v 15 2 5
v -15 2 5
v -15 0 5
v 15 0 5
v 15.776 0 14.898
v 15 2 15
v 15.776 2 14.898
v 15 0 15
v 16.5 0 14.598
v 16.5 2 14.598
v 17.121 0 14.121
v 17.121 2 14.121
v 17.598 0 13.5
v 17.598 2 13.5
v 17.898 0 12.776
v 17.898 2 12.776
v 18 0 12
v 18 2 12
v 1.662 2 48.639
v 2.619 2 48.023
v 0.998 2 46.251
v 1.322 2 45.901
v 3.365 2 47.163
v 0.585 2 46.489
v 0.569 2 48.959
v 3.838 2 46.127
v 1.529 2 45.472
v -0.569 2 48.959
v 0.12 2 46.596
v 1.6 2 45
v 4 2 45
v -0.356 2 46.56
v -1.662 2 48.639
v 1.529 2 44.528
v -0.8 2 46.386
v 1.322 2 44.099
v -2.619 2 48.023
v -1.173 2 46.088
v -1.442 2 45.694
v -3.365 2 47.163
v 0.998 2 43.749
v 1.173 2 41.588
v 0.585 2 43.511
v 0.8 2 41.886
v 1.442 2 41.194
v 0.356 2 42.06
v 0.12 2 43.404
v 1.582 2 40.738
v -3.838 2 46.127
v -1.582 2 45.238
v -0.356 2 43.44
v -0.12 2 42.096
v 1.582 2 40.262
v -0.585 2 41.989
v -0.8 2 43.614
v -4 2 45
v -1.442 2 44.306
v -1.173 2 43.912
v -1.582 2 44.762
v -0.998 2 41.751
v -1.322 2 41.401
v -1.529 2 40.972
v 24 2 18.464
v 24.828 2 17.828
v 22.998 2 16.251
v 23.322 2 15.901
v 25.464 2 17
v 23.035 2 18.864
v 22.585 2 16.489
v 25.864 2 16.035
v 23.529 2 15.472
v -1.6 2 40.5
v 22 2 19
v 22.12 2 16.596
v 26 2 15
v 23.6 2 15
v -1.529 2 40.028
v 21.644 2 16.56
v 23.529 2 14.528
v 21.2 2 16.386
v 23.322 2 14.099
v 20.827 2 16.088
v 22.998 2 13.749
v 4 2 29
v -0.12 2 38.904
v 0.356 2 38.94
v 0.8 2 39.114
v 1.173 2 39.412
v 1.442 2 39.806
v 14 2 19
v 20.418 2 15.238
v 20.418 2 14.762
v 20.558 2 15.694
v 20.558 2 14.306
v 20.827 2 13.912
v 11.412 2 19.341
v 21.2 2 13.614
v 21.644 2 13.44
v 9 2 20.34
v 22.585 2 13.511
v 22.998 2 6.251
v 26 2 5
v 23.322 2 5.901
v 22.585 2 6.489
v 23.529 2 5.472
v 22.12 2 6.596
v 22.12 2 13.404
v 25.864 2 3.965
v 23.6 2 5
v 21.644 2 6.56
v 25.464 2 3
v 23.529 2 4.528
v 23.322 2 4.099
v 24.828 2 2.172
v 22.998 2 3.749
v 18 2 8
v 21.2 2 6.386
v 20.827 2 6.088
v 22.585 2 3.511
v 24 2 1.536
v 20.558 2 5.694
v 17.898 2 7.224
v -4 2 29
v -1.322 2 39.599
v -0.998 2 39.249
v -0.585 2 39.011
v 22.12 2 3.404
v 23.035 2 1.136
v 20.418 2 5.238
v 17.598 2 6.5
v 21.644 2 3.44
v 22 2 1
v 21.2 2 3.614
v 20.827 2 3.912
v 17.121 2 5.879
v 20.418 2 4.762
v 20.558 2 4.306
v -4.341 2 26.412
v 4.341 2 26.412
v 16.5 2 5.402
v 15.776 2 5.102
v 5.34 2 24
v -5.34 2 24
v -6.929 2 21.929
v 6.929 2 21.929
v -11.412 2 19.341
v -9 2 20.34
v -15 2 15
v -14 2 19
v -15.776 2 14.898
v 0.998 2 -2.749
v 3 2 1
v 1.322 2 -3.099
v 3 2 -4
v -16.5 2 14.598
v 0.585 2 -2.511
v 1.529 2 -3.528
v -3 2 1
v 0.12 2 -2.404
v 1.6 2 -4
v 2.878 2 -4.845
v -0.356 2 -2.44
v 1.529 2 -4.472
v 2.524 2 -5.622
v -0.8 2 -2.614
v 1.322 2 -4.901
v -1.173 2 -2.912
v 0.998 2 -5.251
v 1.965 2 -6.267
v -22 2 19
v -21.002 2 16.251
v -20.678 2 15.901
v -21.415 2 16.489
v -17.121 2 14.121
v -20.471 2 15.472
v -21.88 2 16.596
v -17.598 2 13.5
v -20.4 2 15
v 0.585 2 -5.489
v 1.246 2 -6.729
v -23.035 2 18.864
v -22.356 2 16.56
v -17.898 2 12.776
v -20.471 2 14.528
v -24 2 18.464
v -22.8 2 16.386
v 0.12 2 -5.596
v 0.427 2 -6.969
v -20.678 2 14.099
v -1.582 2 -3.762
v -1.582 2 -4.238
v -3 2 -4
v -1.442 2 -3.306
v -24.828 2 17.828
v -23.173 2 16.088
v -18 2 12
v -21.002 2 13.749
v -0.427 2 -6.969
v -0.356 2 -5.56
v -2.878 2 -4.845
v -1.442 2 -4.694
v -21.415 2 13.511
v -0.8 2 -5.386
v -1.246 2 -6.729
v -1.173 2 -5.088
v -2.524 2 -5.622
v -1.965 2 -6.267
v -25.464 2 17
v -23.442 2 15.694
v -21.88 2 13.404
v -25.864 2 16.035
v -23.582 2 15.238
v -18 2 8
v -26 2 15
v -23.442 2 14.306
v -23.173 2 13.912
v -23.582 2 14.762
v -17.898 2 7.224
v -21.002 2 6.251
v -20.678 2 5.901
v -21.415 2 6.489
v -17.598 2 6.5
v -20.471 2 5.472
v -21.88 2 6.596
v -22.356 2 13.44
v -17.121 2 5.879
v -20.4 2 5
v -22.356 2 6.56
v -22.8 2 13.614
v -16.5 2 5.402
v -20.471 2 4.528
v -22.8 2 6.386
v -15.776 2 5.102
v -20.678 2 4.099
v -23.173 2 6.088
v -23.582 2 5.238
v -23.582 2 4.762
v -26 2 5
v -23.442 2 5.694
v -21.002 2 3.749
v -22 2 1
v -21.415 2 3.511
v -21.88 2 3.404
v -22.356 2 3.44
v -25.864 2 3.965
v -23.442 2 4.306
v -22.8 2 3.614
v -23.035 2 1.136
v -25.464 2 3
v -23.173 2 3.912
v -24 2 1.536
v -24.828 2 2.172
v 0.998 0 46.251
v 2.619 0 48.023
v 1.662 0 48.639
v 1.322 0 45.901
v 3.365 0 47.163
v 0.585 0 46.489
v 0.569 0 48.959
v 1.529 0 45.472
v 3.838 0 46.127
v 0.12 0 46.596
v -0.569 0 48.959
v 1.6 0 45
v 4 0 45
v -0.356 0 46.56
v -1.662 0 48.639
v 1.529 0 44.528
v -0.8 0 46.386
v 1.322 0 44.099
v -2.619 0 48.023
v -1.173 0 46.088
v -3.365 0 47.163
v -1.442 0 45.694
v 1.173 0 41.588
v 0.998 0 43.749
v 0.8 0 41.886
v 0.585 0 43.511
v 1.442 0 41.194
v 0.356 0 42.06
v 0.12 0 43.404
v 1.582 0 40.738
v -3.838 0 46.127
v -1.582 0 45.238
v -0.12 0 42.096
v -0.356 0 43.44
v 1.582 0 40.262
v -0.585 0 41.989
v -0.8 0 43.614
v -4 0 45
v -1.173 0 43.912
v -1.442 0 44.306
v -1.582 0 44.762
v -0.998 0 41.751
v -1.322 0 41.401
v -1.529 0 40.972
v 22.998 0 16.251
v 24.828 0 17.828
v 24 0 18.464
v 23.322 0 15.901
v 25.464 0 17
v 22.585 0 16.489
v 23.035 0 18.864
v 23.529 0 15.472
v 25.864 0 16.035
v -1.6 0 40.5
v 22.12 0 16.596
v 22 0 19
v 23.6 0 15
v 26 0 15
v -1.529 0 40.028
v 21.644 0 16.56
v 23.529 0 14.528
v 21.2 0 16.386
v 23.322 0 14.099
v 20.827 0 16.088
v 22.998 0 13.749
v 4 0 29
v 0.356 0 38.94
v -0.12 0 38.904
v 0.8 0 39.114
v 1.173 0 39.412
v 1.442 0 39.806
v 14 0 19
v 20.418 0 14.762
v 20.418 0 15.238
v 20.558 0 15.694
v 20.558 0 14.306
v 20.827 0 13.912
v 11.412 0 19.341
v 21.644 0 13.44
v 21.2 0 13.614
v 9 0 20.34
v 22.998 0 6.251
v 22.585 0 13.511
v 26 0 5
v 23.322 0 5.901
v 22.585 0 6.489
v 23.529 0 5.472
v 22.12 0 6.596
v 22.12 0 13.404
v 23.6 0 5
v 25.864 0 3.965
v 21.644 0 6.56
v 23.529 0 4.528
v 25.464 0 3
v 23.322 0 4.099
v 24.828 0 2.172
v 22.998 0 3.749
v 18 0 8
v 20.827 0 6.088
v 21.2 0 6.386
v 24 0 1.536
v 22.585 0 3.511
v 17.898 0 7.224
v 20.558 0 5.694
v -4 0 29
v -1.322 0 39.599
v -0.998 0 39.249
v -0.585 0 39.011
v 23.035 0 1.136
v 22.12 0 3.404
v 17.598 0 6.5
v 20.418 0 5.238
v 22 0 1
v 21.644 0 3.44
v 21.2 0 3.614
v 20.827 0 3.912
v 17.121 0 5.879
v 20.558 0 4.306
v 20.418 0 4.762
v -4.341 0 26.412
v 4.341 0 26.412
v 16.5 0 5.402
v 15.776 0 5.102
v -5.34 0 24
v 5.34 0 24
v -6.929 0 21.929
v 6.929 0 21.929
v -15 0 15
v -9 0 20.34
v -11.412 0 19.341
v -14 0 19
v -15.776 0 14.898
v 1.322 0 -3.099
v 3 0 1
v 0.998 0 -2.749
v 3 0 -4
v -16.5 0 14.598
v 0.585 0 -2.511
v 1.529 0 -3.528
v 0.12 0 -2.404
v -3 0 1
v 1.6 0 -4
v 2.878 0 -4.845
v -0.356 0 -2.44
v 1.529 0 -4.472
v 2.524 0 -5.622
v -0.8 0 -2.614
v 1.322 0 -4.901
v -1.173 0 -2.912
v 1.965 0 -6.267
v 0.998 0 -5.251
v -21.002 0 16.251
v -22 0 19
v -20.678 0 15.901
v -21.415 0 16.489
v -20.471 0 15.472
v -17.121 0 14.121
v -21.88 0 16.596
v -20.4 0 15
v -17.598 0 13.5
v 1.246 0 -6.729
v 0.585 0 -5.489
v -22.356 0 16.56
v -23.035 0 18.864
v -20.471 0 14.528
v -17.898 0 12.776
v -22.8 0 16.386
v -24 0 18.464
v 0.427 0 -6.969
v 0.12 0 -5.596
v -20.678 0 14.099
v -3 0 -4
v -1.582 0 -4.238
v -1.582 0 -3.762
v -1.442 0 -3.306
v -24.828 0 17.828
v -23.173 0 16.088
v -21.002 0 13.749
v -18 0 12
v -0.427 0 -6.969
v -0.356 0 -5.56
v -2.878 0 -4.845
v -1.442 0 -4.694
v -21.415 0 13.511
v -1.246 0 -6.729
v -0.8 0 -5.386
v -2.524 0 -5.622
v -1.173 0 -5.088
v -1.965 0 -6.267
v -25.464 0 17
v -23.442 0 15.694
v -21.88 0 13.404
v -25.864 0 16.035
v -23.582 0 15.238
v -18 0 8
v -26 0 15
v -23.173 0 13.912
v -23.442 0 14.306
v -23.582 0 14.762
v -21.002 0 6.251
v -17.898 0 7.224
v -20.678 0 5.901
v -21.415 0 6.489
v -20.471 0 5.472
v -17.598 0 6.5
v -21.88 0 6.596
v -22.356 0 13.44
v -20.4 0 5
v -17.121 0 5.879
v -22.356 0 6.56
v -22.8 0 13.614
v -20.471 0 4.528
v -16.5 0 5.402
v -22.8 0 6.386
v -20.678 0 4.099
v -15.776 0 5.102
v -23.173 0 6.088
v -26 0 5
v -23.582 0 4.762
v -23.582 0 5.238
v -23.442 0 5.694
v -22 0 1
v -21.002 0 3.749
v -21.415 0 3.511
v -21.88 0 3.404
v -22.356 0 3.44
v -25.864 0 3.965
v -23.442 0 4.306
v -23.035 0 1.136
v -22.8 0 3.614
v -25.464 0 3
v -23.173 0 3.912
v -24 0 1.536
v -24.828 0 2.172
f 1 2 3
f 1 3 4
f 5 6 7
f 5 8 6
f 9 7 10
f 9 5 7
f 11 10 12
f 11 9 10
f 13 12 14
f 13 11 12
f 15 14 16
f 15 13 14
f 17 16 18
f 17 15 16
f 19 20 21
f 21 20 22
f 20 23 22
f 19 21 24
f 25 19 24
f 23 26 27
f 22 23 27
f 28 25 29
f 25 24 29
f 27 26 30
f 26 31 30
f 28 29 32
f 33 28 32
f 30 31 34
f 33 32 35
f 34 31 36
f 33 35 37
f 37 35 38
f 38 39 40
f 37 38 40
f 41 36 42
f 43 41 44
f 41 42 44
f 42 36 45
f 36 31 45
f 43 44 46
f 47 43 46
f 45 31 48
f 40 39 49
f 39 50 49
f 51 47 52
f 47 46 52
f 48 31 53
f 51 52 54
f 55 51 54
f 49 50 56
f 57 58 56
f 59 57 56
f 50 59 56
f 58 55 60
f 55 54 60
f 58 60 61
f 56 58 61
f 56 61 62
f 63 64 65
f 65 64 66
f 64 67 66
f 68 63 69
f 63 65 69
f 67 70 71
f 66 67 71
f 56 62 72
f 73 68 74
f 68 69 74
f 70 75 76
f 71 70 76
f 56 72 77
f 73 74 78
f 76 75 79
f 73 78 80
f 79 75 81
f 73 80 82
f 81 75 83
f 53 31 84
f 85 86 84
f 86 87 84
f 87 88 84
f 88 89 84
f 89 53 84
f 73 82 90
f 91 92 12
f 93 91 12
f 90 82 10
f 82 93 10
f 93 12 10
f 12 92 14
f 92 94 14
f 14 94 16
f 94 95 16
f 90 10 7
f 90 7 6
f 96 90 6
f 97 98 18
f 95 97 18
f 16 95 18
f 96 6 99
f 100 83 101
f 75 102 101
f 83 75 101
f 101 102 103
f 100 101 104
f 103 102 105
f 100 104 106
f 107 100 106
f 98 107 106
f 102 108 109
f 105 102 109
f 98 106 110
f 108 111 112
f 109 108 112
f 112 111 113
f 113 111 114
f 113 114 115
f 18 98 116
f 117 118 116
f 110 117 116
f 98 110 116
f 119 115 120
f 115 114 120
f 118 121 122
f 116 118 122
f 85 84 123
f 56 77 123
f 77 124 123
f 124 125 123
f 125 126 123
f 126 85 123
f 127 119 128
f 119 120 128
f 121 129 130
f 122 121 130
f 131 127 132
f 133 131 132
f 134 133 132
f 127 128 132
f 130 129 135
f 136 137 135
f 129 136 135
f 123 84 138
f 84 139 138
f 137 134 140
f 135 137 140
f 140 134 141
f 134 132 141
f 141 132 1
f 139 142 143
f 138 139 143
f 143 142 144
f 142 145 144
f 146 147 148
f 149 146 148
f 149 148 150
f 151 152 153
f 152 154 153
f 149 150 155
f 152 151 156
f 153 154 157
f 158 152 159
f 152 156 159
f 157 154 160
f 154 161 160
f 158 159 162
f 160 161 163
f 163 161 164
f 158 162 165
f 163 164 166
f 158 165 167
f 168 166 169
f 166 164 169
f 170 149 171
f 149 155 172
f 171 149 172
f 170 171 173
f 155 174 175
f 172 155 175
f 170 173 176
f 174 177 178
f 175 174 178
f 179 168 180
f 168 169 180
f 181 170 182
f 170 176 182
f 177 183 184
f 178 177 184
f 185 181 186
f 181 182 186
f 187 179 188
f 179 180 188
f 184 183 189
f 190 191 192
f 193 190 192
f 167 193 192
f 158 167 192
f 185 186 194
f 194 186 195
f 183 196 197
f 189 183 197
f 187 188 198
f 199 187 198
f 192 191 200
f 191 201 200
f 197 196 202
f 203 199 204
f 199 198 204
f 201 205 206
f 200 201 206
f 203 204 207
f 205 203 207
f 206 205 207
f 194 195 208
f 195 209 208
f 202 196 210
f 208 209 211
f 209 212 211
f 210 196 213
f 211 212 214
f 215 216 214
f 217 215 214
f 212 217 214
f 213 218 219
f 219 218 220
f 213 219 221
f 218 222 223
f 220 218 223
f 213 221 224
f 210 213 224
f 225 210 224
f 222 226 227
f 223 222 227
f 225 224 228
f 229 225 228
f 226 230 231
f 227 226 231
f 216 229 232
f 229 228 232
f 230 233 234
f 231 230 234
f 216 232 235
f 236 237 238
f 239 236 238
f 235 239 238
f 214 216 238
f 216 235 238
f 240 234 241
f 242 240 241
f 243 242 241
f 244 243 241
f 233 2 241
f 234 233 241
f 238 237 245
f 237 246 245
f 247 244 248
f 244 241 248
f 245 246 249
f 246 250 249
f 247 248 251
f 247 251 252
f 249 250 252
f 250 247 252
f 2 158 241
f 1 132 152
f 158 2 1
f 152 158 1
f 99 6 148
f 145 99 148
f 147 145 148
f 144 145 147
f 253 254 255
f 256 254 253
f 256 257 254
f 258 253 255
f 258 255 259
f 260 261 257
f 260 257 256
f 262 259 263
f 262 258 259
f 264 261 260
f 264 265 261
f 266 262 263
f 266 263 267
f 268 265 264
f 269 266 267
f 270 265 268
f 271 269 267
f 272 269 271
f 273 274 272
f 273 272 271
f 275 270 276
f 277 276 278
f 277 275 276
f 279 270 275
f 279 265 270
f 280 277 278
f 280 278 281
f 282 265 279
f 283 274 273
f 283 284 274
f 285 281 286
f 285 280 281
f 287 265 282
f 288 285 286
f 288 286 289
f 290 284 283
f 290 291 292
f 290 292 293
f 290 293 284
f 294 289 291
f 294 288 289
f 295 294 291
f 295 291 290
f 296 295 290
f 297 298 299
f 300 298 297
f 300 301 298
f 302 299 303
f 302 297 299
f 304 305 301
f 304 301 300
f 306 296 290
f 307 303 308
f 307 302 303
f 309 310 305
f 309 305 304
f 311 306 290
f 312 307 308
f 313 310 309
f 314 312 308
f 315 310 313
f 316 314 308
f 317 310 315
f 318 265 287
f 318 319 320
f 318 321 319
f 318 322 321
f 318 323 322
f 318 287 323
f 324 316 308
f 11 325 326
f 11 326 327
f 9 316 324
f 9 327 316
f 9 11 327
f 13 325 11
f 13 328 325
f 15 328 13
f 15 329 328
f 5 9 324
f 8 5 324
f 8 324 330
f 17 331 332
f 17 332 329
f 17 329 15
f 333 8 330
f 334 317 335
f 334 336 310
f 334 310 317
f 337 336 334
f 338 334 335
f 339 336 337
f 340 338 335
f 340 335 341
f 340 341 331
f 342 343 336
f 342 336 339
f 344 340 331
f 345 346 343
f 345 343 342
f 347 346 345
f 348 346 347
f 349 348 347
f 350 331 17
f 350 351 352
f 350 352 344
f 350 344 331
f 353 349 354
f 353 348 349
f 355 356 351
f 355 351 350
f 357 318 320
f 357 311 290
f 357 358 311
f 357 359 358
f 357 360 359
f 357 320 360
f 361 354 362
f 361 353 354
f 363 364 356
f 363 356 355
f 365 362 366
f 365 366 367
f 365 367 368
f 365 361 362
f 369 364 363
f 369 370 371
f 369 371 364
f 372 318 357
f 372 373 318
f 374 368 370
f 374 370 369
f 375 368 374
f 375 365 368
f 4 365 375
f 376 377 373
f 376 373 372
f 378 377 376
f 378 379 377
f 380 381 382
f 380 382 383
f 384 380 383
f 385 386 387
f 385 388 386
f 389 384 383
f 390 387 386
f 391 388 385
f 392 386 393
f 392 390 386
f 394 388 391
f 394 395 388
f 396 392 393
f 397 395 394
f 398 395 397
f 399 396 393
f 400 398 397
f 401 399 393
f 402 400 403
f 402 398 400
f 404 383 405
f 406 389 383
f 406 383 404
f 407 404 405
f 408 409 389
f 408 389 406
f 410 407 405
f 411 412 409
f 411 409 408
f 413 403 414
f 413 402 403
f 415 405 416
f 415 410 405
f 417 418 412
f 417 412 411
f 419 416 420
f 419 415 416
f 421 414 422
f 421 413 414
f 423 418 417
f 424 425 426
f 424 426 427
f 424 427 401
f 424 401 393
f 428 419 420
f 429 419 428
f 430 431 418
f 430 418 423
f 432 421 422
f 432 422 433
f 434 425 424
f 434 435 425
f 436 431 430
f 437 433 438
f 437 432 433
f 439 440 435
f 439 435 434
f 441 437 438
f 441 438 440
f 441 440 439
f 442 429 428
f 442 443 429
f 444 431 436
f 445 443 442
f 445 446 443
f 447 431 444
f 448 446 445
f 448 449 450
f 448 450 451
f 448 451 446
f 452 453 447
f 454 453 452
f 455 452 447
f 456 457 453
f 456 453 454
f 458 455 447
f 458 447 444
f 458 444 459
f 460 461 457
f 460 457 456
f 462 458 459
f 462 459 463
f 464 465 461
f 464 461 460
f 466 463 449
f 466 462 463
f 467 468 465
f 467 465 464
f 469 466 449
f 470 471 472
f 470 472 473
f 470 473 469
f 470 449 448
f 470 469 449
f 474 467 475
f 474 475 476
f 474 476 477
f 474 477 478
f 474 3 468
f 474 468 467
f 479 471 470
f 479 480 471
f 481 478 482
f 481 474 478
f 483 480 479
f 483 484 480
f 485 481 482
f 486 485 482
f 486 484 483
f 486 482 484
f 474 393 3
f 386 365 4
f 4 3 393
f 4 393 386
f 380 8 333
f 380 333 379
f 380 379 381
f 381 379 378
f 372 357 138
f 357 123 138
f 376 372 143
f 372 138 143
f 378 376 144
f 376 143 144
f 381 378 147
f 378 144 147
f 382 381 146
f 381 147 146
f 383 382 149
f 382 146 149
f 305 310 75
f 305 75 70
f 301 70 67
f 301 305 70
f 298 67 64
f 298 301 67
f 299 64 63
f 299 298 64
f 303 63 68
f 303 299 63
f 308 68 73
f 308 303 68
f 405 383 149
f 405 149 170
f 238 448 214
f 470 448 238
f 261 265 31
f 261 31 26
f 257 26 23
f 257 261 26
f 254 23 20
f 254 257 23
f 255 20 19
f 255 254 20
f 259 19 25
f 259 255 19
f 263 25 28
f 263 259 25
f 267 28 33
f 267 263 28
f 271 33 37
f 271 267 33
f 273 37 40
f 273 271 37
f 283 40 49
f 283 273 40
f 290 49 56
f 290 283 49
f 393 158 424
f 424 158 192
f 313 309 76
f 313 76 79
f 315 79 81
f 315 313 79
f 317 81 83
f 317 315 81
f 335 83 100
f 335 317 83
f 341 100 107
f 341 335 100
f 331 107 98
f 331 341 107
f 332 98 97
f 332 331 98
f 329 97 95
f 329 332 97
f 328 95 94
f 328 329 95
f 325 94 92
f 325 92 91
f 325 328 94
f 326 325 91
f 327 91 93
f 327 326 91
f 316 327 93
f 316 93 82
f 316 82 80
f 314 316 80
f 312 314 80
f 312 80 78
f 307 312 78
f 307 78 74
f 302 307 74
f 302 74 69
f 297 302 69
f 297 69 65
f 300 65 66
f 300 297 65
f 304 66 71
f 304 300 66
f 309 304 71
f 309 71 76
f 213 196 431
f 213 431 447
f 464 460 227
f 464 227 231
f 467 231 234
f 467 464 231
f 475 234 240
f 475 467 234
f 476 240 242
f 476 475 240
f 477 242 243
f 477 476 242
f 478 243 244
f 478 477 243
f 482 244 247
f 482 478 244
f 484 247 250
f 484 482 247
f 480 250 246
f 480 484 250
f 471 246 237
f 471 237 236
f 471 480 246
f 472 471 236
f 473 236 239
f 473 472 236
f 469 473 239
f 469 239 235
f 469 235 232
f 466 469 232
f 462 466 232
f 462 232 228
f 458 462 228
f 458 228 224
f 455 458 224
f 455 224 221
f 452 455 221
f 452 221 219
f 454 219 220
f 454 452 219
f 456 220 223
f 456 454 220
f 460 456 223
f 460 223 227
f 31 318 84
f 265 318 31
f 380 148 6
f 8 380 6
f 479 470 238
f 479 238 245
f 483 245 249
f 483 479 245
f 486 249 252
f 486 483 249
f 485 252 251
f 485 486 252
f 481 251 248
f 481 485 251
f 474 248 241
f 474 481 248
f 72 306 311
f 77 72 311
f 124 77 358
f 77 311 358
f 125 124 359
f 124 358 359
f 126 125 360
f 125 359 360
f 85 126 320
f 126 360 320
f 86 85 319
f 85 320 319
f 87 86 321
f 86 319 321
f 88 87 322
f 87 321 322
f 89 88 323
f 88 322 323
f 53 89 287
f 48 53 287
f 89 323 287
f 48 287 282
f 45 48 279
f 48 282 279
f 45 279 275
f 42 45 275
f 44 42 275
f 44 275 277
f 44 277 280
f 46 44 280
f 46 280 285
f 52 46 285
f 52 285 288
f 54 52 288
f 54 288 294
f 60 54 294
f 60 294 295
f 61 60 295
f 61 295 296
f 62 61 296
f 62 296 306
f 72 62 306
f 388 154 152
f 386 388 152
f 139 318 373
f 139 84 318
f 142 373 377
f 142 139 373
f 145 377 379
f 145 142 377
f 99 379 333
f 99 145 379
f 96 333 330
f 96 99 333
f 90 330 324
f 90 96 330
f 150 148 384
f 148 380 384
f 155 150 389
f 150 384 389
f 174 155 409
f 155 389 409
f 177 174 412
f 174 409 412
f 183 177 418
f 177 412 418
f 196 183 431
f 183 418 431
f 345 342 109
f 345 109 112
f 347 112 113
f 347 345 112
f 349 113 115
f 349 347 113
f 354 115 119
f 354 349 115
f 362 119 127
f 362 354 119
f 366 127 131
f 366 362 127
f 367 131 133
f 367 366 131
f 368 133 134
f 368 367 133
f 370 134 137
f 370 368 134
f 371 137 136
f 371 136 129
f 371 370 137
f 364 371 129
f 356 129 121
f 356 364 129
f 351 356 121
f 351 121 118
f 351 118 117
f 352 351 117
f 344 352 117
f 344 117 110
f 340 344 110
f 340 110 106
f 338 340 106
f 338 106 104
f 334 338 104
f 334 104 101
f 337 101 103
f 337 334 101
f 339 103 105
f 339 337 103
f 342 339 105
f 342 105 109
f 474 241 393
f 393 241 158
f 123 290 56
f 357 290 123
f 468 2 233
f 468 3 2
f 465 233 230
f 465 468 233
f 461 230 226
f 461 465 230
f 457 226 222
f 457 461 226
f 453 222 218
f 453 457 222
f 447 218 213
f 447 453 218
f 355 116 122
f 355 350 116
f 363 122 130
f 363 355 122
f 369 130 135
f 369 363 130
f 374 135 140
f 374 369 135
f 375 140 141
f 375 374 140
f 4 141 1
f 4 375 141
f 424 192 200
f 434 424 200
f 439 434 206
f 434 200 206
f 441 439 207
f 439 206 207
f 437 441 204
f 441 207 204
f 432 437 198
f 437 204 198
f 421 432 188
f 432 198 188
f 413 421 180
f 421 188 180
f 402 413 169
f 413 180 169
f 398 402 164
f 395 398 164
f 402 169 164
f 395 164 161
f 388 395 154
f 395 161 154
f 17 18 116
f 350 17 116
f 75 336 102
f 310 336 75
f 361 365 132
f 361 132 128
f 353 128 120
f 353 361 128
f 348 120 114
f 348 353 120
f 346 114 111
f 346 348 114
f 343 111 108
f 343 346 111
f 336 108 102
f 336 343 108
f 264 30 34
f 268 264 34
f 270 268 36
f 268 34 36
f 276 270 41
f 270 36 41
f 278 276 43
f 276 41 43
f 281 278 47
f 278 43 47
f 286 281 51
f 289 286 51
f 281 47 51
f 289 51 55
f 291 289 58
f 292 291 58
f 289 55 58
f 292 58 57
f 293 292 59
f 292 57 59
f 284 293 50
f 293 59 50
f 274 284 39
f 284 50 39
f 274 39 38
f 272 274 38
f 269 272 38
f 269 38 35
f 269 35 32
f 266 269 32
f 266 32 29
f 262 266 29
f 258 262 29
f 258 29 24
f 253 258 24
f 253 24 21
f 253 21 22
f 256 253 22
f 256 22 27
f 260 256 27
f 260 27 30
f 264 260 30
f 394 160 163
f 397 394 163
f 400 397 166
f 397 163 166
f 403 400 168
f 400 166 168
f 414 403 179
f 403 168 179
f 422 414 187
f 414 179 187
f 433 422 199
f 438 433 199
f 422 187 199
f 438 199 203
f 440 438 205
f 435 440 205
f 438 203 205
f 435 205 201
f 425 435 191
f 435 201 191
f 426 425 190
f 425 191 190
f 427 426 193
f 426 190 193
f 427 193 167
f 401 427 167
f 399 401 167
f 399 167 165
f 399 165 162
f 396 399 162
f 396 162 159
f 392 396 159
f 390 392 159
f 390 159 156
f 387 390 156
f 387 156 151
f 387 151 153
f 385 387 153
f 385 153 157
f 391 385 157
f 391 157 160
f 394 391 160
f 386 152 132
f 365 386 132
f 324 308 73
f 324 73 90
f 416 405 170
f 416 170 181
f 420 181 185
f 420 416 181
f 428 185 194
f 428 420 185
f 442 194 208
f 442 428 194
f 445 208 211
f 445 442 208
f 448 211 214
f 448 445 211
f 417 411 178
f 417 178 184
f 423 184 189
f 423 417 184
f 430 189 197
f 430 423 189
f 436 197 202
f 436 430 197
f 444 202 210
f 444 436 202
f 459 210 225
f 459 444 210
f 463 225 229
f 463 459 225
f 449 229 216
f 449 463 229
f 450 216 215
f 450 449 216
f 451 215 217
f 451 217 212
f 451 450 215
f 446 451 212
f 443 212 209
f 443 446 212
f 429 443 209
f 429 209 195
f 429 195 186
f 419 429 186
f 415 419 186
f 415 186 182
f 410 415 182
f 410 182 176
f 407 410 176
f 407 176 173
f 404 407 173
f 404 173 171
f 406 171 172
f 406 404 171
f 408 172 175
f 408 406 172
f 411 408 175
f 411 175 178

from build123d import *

# Parameters (mm, degrees)
SKETCH1_R            = 1.6
BOSS_EXTRUDE1_DEPTH  = 2
FILLET1_R            = 10
SKETCH2_R            = 4
BOSS_EXTRUDE3_DEPTH  = 2
SKETCH4_R            = 1.6
CUT_EXTRUDE2_DEPTH   = 4
CUT_EXTRUDE3_DEPTH   = 10
SKETCH6_R            = 3
SKETCH6_R_2          = 1.6
BOSS_EXTRUDE4_DEPTH  = 2
SKETCH7_R            = 1.6
CUT_EXTRUDE4_DEPTH   = 10
SKETCH8_W            = 36
SKETCH8_H            = 10
CUT_EXTRUDE6_DEPTH   = 9.5
FILLET3_R            = 3
SKETCH9_R            = 1.6
BOSS_EXTRUDE5_DEPTH  = 2
SKETCH10_R           = 1.6
BOSS_EXTRUDE6_DEPTH  = 2
SKETCH11_R           = 1.6
CUT_EXTRUDE7_DEPTH   = 10
BOSS_EXTRUDE7_DEPTH  = 2
SKETCH13_R           = 1.6
CUT_EXTRUDE9_DEPTH   = 5.5
BOSS_EXTRUDE8_DEPTH  = 2
SKETCH16_R           = 1.6
CUT_EXTRUDE10_DEPTH  = 10
SKETCH17_R           = 2.884899687
BOSS_EXTRUDE9_DEPTH  = 1
SKETCH18_R           = 1.6
BOSS_EXTRUDE10_DEPTH = 3
SKETCH19_R           = 1.6
SKETCH19_R_2         = 1.5
CUT_EXTRUDE11_DEPTH  = 2
SKETCH20_R           = 1.6
CUT_EXTRUDE12_DEPTH  = 10
SKETCH21_R           = 1.5
CUT_EXTRUDE13_DEPTH  = 8.5


with BuildPart() as part:
    # Sketch1 → Boss-Extrude1 (new body)
    with BuildSketch(Plane(origin=(0, 0, 0), x_dir=(1, 0, 0), z_dir=(0, 1, 0))):
        with BuildLine():
            Line((-4, -45), (-4, -30))
            Line((-4, -30), (-4, -19))
            Line((-4, -19), (-22, -19))
            ThreePointArc((-22, -19), (-24.828427125, -17.828427125), (-26, -15))
            Line((-26, -15), (-26, -5))
            ThreePointArc((-26, -5), (-24.828427125, -2.171572875), (-22, -1))
            Line((-22, -1), (-4, -1))
            Line((-4, -1), (-4, 0))
            ThreePointArc((-4, 0), (0, 4), (4, 0))
            Line((4, 0), (4, -1))
            Line((4, -1), (22, -1))
            ThreePointArc((22, -1), (24.828427125, -2.171572875), (26, -5))
            Line((26, -5), (26, -15))
            ThreePointArc((26, -15), (24.828427125, -17.828427125), (22, -19))
            Line((22, -19), (4, -19))
            Line((4, -19), (4, -30))
            Line((4, -30), (4, -45))
            ThreePointArc((4, -45), (0, -49), (-4, -45))
        make_face()
        with Locations((-22, -5)):
            Circle(SKETCH1_R, mode=Mode.SUBTRACT)
        Circle(SKETCH1_R, mode=Mode.SUBTRACT)
        with Locations((22, -5)):
            Circle(SKETCH1_R, mode=Mode.SUBTRACT)
        with Locations((22, -15)):
            Circle(SKETCH1_R, mode=Mode.SUBTRACT)
        with Locations((-22, -15)):
            Circle(SKETCH1_R, mode=Mode.SUBTRACT)
        with BuildLine():
            ThreePointArc((-1.6, -45), (0, -46.6), (1.6, -45))
            Line((1.6, -45), (1.6, -30))
            ThreePointArc((1.6, -30), (0, -28.4), (-1.6, -30))
            Line((-1.6, -30), (-1.6, -45))
        make_face(mode=Mode.SUBTRACT)
    extrude(amount=BOSS_EXTRUDE1_DEPTH)

    # Fillet1
    fillet1_edges = [part.edges().sort_by_distance(p)[0] for p in [
        (-4, 1, 19),
        (4, 1, 19),
    ]]
    fillet(fillet1_edges, radius=FILLET1_R)

    # Sketch2 → Boss-Extrude3 (add)
    with BuildSketch(Plane(origin=(0, 2, 0), x_dir=(1, 0, 0), z_dir=(0, 1, 0))):
        with BuildLine():
            ThreePointArc((-3.708099244, 1.5), (-2.797344782, 2.859171588), (-1.41859085, 3.74))
            ThreePointArc((-1.41859085, 3.74), (0, 4.6), (1.41859085, 3.74))
            ThreePointArc((1.41859085, 3.74), (2.797344782, 2.859171588), (3.708099244, 1.5))
            ThreePointArc((3.708099244, 1.5), (3.92634671, 2.23593095), (4, 3))
            ThreePointArc((4, 3), (0, 7), (-4, 3))
            ThreePointArc((-4, 3), (-3.92634671, 2.23593095), (-3.708099244, 1.5))
        make_face()
        with BuildLine():
            ThreePointArc((4, 3), (3.92634671, 2.23593095), (3.708099244, 1.5))
            ThreePointArc((3.708099244, 1.5), (3.92634671, 0.76406905), (4, 0))
            Line((4, 0), (4, 3))
        make_face()
        with BuildLine():
            ThreePointArc((-4, 0), (-3.92634671, 0.76406905), (-3.708099244, 1.5))
            ThreePointArc((-3.708099244, 1.5), (-3.92634671, 2.23593095), (-4, 3))
            Line((-4, 3), (-4, 0))
        make_face()
        Circle(SKETCH2_R)
    extrude(amount=-BOSS_EXTRUDE3_DEPTH)

    # Sketch4 → Cut-Extrude2 (cut)
    with BuildSketch(Plane(origin=(0, 2, 0), x_dir=(1, 0, 0), z_dir=(0, 1, 0))):
        with Locations((0, 3)):
            Circle(SKETCH4_R)
    extrude(amount=-CUT_EXTRUDE2_DEPTH, mode=Mode.SUBTRACT)

    # Sketch5 → Cut-Extrude3 (cut)
    with BuildSketch(Plane(origin=(0, 2, 0), x_dir=(1, 0, 0), z_dir=(0, 1, 0))):
        Polygon((-4, -1), (4, -1), (9.121752044, 12.8952039), (-11.957584595, 14.407484274), align=None)
    extrude(amount=-CUT_EXTRUDE3_DEPTH, mode=Mode.SUBTRACT)

    # Sketch6 → Boss-Extrude4 (add)
    with BuildSketch(Plane(origin=(0, 2, 0), x_dir=(1, 0, 0), z_dir=(0, 1, 0))):
        with Locations((0, -1)):
            Circle(SKETCH6_R)
        with Locations((0, -1)):
            Circle(SKETCH6_R_2, mode=Mode.SUBTRACT)
    extrude(amount=-BOSS_EXTRUDE4_DEPTH)

    # Sketch7 → Cut-Extrude4 (cut)
    with BuildSketch(Plane(origin=(0, 2, 0), x_dir=(1, 0, 0), z_dir=(0, 1, 0))):
        with Locations((0, -1)):
            Circle(SKETCH7_R)
    extrude(amount=-CUT_EXTRUDE4_DEPTH, mode=Mode.SUBTRACT)

    # Sketch8 → Cut-Extrude6 (cut)
    with BuildSketch(Plane(origin=(0, 2, 0), x_dir=(1, 0, 0), z_dir=(0, 1, 0))):
        with Locations((0, -10)):
            Rectangle(SKETCH8_W, SKETCH8_H)
    extrude(amount=-CUT_EXTRUDE6_DEPTH, mode=Mode.SUBTRACT)

    # Fillet3
    fillet3_edges = [part.edges().sort_by_distance(p)[0] for p in [
        (-18, 1, 5),
        (18, 1, 5),
        (18, 1, 15),
        (-18, 1, 15),
    ]]
    fillet(fillet3_edges, radius=FILLET3_R)

    # Sketch9 → Boss-Extrude5 (add)
    with BuildSketch(Plane(origin=(0, 2, 0), x_dir=(1, 0, 0), z_dir=(0, 1, 0))):
        with Locations((0, -1)):
            Circle(SKETCH9_R)
    extrude(amount=-BOSS_EXTRUDE5_DEPTH)

    # Sketch10 → Boss-Extrude6 (add)
    with BuildSketch(Plane(origin=(0, 2, 0), x_dir=(1, 0, 0), z_dir=(0, 1, 0))):
        with BuildLine():
            Line((3, -1), (3, 3))
            ThreePointArc((3, 3), (0, 6), (-3, 3))
            Line((-3, 3), (-3, -1))
            Line((-3, -1), (3, -1))
        make_face()
        with Locations((0, 3)):
            Circle(SKETCH10_R, mode=Mode.SUBTRACT)
    extrude(amount=-BOSS_EXTRUDE6_DEPTH)

    # Sketch11 → Cut-Extrude7 (cut)
    with BuildSketch(Plane(origin=(0, 2, 0), x_dir=(1, 0, 0), z_dir=(0, 1, 0))):
        with Locations((0, 3)):
            Circle(SKETCH11_R)
    extrude(amount=-CUT_EXTRUDE7_DEPTH, mode=Mode.SUBTRACT)

    # Sketch12 → Boss-Extrude7 (add)
    with BuildSketch(Plane(origin=(0, 2, 0), x_dir=(1, 0, 0), z_dir=(0, 1, 0))):
        with BuildLine():
            Line((-3, 3), (-3, 4))
            ThreePointArc((-3, 4), (0, 7), (3, 4))
            Line((3, 4), (3, 3))
            Line((3, 3), (2.828427125, 3))
            ThreePointArc((2.828427125, 3), (0, 1), (-2.828427125, 3))
            Line((-2.828427125, 3), (-3, 3))
        make_face()
    extrude(amount=-BOSS_EXTRUDE7_DEPTH)

    # Sketch13 → Cut-Extrude9 (cut)
    with BuildSketch(Plane(origin=(0, 2, 0), x_dir=(1, 0, 0), z_dir=(0, 1, 0))):
        with Locations((0, 4)):
            Circle(SKETCH13_R)
    extrude(amount=-CUT_EXTRUDE9_DEPTH, mode=Mode.SUBTRACT)

    # Sketch15 → Boss-Extrude8 (add)
    with BuildSketch(Plane(origin=(0, 2, 0), x_dir=(1, 0, 0), z_dir=(0, 1, 0))):
        with BuildLine():
            Line((-4, -45), (-4, -23.953750057))
            Line((-4, -23.953750057), (4, -23.953750057))
            Line((4, -23.953750057), (4, -45))
            ThreePointArc((4, -45), (0, -49), (-4, -45))
        make_face()
    extrude(amount=-BOSS_EXTRUDE8_DEPTH)

    # Sketch16 → Cut-Extrude10 (cut)
    with BuildSketch(Plane(origin=(0, 2, 0), x_dir=(1, 0, 0), z_dir=(0, 1, 0))):
        with Locations((0, -45)):
            Circle(SKETCH16_R)
        with Locations((0, -36)):
            Circle(SKETCH16_R)
    extrude(amount=-CUT_EXTRUDE10_DEPTH, mode=Mode.SUBTRACT)

    # Sketch17 → Boss-Extrude9 (add)
    with BuildSketch(Plane(origin=(0, 2, 0), x_dir=(1, 0, 0), z_dir=(0, 1, 0))):
        with Locations((0, -36)):
            Circle(SKETCH17_R)
    extrude(amount=-BOSS_EXTRUDE9_DEPTH)

    # Sketch18 → Boss-Extrude10 (add)
    with BuildSketch(Plane(origin=(0, 1, 0), x_dir=(-1, 0, 0), z_dir=(0, -1, 0))):
        with Locations((0, -36)):
            Circle(SKETCH18_R)
    extrude(amount=BOSS_EXTRUDE10_DEPTH)

    # Sketch19 → Cut-Extrude11 (cut)
    with BuildSketch(Plane(origin=(0, -2, 0), x_dir=(-1, 0, 0), z_dir=(0, -1, 0))):
        with Locations((0, -36)):
            Circle(SKETCH19_R)
        with Locations((0, -36)):
            Circle(SKETCH19_R_2, mode=Mode.SUBTRACT)
    extrude(amount=-CUT_EXTRUDE11_DEPTH, mode=Mode.SUBTRACT)

    # Sketch20 → Cut-Extrude12 (cut)
    with BuildSketch(Plane(origin=(0, 0, 0), x_dir=(-1, 0, 0), z_dir=(0, -1, 0))):
        with Locations((0, -40.5)):
            Circle(SKETCH20_R)
    extrude(amount=-CUT_EXTRUDE12_DEPTH, mode=Mode.SUBTRACT)

    # Sketch21 → Cut-Extrude13 (cut)
    with BuildSketch(Plane(origin=(0, 0, 0), x_dir=(-1, 0, 0), z_dir=(0, -1, 0))):
        with Locations((0, -36)):
            Circle(SKETCH21_R)
    extrude(amount=CUT_EXTRUDE13_DEPTH, mode=Mode.SUBTRACT)


solid = part.part
